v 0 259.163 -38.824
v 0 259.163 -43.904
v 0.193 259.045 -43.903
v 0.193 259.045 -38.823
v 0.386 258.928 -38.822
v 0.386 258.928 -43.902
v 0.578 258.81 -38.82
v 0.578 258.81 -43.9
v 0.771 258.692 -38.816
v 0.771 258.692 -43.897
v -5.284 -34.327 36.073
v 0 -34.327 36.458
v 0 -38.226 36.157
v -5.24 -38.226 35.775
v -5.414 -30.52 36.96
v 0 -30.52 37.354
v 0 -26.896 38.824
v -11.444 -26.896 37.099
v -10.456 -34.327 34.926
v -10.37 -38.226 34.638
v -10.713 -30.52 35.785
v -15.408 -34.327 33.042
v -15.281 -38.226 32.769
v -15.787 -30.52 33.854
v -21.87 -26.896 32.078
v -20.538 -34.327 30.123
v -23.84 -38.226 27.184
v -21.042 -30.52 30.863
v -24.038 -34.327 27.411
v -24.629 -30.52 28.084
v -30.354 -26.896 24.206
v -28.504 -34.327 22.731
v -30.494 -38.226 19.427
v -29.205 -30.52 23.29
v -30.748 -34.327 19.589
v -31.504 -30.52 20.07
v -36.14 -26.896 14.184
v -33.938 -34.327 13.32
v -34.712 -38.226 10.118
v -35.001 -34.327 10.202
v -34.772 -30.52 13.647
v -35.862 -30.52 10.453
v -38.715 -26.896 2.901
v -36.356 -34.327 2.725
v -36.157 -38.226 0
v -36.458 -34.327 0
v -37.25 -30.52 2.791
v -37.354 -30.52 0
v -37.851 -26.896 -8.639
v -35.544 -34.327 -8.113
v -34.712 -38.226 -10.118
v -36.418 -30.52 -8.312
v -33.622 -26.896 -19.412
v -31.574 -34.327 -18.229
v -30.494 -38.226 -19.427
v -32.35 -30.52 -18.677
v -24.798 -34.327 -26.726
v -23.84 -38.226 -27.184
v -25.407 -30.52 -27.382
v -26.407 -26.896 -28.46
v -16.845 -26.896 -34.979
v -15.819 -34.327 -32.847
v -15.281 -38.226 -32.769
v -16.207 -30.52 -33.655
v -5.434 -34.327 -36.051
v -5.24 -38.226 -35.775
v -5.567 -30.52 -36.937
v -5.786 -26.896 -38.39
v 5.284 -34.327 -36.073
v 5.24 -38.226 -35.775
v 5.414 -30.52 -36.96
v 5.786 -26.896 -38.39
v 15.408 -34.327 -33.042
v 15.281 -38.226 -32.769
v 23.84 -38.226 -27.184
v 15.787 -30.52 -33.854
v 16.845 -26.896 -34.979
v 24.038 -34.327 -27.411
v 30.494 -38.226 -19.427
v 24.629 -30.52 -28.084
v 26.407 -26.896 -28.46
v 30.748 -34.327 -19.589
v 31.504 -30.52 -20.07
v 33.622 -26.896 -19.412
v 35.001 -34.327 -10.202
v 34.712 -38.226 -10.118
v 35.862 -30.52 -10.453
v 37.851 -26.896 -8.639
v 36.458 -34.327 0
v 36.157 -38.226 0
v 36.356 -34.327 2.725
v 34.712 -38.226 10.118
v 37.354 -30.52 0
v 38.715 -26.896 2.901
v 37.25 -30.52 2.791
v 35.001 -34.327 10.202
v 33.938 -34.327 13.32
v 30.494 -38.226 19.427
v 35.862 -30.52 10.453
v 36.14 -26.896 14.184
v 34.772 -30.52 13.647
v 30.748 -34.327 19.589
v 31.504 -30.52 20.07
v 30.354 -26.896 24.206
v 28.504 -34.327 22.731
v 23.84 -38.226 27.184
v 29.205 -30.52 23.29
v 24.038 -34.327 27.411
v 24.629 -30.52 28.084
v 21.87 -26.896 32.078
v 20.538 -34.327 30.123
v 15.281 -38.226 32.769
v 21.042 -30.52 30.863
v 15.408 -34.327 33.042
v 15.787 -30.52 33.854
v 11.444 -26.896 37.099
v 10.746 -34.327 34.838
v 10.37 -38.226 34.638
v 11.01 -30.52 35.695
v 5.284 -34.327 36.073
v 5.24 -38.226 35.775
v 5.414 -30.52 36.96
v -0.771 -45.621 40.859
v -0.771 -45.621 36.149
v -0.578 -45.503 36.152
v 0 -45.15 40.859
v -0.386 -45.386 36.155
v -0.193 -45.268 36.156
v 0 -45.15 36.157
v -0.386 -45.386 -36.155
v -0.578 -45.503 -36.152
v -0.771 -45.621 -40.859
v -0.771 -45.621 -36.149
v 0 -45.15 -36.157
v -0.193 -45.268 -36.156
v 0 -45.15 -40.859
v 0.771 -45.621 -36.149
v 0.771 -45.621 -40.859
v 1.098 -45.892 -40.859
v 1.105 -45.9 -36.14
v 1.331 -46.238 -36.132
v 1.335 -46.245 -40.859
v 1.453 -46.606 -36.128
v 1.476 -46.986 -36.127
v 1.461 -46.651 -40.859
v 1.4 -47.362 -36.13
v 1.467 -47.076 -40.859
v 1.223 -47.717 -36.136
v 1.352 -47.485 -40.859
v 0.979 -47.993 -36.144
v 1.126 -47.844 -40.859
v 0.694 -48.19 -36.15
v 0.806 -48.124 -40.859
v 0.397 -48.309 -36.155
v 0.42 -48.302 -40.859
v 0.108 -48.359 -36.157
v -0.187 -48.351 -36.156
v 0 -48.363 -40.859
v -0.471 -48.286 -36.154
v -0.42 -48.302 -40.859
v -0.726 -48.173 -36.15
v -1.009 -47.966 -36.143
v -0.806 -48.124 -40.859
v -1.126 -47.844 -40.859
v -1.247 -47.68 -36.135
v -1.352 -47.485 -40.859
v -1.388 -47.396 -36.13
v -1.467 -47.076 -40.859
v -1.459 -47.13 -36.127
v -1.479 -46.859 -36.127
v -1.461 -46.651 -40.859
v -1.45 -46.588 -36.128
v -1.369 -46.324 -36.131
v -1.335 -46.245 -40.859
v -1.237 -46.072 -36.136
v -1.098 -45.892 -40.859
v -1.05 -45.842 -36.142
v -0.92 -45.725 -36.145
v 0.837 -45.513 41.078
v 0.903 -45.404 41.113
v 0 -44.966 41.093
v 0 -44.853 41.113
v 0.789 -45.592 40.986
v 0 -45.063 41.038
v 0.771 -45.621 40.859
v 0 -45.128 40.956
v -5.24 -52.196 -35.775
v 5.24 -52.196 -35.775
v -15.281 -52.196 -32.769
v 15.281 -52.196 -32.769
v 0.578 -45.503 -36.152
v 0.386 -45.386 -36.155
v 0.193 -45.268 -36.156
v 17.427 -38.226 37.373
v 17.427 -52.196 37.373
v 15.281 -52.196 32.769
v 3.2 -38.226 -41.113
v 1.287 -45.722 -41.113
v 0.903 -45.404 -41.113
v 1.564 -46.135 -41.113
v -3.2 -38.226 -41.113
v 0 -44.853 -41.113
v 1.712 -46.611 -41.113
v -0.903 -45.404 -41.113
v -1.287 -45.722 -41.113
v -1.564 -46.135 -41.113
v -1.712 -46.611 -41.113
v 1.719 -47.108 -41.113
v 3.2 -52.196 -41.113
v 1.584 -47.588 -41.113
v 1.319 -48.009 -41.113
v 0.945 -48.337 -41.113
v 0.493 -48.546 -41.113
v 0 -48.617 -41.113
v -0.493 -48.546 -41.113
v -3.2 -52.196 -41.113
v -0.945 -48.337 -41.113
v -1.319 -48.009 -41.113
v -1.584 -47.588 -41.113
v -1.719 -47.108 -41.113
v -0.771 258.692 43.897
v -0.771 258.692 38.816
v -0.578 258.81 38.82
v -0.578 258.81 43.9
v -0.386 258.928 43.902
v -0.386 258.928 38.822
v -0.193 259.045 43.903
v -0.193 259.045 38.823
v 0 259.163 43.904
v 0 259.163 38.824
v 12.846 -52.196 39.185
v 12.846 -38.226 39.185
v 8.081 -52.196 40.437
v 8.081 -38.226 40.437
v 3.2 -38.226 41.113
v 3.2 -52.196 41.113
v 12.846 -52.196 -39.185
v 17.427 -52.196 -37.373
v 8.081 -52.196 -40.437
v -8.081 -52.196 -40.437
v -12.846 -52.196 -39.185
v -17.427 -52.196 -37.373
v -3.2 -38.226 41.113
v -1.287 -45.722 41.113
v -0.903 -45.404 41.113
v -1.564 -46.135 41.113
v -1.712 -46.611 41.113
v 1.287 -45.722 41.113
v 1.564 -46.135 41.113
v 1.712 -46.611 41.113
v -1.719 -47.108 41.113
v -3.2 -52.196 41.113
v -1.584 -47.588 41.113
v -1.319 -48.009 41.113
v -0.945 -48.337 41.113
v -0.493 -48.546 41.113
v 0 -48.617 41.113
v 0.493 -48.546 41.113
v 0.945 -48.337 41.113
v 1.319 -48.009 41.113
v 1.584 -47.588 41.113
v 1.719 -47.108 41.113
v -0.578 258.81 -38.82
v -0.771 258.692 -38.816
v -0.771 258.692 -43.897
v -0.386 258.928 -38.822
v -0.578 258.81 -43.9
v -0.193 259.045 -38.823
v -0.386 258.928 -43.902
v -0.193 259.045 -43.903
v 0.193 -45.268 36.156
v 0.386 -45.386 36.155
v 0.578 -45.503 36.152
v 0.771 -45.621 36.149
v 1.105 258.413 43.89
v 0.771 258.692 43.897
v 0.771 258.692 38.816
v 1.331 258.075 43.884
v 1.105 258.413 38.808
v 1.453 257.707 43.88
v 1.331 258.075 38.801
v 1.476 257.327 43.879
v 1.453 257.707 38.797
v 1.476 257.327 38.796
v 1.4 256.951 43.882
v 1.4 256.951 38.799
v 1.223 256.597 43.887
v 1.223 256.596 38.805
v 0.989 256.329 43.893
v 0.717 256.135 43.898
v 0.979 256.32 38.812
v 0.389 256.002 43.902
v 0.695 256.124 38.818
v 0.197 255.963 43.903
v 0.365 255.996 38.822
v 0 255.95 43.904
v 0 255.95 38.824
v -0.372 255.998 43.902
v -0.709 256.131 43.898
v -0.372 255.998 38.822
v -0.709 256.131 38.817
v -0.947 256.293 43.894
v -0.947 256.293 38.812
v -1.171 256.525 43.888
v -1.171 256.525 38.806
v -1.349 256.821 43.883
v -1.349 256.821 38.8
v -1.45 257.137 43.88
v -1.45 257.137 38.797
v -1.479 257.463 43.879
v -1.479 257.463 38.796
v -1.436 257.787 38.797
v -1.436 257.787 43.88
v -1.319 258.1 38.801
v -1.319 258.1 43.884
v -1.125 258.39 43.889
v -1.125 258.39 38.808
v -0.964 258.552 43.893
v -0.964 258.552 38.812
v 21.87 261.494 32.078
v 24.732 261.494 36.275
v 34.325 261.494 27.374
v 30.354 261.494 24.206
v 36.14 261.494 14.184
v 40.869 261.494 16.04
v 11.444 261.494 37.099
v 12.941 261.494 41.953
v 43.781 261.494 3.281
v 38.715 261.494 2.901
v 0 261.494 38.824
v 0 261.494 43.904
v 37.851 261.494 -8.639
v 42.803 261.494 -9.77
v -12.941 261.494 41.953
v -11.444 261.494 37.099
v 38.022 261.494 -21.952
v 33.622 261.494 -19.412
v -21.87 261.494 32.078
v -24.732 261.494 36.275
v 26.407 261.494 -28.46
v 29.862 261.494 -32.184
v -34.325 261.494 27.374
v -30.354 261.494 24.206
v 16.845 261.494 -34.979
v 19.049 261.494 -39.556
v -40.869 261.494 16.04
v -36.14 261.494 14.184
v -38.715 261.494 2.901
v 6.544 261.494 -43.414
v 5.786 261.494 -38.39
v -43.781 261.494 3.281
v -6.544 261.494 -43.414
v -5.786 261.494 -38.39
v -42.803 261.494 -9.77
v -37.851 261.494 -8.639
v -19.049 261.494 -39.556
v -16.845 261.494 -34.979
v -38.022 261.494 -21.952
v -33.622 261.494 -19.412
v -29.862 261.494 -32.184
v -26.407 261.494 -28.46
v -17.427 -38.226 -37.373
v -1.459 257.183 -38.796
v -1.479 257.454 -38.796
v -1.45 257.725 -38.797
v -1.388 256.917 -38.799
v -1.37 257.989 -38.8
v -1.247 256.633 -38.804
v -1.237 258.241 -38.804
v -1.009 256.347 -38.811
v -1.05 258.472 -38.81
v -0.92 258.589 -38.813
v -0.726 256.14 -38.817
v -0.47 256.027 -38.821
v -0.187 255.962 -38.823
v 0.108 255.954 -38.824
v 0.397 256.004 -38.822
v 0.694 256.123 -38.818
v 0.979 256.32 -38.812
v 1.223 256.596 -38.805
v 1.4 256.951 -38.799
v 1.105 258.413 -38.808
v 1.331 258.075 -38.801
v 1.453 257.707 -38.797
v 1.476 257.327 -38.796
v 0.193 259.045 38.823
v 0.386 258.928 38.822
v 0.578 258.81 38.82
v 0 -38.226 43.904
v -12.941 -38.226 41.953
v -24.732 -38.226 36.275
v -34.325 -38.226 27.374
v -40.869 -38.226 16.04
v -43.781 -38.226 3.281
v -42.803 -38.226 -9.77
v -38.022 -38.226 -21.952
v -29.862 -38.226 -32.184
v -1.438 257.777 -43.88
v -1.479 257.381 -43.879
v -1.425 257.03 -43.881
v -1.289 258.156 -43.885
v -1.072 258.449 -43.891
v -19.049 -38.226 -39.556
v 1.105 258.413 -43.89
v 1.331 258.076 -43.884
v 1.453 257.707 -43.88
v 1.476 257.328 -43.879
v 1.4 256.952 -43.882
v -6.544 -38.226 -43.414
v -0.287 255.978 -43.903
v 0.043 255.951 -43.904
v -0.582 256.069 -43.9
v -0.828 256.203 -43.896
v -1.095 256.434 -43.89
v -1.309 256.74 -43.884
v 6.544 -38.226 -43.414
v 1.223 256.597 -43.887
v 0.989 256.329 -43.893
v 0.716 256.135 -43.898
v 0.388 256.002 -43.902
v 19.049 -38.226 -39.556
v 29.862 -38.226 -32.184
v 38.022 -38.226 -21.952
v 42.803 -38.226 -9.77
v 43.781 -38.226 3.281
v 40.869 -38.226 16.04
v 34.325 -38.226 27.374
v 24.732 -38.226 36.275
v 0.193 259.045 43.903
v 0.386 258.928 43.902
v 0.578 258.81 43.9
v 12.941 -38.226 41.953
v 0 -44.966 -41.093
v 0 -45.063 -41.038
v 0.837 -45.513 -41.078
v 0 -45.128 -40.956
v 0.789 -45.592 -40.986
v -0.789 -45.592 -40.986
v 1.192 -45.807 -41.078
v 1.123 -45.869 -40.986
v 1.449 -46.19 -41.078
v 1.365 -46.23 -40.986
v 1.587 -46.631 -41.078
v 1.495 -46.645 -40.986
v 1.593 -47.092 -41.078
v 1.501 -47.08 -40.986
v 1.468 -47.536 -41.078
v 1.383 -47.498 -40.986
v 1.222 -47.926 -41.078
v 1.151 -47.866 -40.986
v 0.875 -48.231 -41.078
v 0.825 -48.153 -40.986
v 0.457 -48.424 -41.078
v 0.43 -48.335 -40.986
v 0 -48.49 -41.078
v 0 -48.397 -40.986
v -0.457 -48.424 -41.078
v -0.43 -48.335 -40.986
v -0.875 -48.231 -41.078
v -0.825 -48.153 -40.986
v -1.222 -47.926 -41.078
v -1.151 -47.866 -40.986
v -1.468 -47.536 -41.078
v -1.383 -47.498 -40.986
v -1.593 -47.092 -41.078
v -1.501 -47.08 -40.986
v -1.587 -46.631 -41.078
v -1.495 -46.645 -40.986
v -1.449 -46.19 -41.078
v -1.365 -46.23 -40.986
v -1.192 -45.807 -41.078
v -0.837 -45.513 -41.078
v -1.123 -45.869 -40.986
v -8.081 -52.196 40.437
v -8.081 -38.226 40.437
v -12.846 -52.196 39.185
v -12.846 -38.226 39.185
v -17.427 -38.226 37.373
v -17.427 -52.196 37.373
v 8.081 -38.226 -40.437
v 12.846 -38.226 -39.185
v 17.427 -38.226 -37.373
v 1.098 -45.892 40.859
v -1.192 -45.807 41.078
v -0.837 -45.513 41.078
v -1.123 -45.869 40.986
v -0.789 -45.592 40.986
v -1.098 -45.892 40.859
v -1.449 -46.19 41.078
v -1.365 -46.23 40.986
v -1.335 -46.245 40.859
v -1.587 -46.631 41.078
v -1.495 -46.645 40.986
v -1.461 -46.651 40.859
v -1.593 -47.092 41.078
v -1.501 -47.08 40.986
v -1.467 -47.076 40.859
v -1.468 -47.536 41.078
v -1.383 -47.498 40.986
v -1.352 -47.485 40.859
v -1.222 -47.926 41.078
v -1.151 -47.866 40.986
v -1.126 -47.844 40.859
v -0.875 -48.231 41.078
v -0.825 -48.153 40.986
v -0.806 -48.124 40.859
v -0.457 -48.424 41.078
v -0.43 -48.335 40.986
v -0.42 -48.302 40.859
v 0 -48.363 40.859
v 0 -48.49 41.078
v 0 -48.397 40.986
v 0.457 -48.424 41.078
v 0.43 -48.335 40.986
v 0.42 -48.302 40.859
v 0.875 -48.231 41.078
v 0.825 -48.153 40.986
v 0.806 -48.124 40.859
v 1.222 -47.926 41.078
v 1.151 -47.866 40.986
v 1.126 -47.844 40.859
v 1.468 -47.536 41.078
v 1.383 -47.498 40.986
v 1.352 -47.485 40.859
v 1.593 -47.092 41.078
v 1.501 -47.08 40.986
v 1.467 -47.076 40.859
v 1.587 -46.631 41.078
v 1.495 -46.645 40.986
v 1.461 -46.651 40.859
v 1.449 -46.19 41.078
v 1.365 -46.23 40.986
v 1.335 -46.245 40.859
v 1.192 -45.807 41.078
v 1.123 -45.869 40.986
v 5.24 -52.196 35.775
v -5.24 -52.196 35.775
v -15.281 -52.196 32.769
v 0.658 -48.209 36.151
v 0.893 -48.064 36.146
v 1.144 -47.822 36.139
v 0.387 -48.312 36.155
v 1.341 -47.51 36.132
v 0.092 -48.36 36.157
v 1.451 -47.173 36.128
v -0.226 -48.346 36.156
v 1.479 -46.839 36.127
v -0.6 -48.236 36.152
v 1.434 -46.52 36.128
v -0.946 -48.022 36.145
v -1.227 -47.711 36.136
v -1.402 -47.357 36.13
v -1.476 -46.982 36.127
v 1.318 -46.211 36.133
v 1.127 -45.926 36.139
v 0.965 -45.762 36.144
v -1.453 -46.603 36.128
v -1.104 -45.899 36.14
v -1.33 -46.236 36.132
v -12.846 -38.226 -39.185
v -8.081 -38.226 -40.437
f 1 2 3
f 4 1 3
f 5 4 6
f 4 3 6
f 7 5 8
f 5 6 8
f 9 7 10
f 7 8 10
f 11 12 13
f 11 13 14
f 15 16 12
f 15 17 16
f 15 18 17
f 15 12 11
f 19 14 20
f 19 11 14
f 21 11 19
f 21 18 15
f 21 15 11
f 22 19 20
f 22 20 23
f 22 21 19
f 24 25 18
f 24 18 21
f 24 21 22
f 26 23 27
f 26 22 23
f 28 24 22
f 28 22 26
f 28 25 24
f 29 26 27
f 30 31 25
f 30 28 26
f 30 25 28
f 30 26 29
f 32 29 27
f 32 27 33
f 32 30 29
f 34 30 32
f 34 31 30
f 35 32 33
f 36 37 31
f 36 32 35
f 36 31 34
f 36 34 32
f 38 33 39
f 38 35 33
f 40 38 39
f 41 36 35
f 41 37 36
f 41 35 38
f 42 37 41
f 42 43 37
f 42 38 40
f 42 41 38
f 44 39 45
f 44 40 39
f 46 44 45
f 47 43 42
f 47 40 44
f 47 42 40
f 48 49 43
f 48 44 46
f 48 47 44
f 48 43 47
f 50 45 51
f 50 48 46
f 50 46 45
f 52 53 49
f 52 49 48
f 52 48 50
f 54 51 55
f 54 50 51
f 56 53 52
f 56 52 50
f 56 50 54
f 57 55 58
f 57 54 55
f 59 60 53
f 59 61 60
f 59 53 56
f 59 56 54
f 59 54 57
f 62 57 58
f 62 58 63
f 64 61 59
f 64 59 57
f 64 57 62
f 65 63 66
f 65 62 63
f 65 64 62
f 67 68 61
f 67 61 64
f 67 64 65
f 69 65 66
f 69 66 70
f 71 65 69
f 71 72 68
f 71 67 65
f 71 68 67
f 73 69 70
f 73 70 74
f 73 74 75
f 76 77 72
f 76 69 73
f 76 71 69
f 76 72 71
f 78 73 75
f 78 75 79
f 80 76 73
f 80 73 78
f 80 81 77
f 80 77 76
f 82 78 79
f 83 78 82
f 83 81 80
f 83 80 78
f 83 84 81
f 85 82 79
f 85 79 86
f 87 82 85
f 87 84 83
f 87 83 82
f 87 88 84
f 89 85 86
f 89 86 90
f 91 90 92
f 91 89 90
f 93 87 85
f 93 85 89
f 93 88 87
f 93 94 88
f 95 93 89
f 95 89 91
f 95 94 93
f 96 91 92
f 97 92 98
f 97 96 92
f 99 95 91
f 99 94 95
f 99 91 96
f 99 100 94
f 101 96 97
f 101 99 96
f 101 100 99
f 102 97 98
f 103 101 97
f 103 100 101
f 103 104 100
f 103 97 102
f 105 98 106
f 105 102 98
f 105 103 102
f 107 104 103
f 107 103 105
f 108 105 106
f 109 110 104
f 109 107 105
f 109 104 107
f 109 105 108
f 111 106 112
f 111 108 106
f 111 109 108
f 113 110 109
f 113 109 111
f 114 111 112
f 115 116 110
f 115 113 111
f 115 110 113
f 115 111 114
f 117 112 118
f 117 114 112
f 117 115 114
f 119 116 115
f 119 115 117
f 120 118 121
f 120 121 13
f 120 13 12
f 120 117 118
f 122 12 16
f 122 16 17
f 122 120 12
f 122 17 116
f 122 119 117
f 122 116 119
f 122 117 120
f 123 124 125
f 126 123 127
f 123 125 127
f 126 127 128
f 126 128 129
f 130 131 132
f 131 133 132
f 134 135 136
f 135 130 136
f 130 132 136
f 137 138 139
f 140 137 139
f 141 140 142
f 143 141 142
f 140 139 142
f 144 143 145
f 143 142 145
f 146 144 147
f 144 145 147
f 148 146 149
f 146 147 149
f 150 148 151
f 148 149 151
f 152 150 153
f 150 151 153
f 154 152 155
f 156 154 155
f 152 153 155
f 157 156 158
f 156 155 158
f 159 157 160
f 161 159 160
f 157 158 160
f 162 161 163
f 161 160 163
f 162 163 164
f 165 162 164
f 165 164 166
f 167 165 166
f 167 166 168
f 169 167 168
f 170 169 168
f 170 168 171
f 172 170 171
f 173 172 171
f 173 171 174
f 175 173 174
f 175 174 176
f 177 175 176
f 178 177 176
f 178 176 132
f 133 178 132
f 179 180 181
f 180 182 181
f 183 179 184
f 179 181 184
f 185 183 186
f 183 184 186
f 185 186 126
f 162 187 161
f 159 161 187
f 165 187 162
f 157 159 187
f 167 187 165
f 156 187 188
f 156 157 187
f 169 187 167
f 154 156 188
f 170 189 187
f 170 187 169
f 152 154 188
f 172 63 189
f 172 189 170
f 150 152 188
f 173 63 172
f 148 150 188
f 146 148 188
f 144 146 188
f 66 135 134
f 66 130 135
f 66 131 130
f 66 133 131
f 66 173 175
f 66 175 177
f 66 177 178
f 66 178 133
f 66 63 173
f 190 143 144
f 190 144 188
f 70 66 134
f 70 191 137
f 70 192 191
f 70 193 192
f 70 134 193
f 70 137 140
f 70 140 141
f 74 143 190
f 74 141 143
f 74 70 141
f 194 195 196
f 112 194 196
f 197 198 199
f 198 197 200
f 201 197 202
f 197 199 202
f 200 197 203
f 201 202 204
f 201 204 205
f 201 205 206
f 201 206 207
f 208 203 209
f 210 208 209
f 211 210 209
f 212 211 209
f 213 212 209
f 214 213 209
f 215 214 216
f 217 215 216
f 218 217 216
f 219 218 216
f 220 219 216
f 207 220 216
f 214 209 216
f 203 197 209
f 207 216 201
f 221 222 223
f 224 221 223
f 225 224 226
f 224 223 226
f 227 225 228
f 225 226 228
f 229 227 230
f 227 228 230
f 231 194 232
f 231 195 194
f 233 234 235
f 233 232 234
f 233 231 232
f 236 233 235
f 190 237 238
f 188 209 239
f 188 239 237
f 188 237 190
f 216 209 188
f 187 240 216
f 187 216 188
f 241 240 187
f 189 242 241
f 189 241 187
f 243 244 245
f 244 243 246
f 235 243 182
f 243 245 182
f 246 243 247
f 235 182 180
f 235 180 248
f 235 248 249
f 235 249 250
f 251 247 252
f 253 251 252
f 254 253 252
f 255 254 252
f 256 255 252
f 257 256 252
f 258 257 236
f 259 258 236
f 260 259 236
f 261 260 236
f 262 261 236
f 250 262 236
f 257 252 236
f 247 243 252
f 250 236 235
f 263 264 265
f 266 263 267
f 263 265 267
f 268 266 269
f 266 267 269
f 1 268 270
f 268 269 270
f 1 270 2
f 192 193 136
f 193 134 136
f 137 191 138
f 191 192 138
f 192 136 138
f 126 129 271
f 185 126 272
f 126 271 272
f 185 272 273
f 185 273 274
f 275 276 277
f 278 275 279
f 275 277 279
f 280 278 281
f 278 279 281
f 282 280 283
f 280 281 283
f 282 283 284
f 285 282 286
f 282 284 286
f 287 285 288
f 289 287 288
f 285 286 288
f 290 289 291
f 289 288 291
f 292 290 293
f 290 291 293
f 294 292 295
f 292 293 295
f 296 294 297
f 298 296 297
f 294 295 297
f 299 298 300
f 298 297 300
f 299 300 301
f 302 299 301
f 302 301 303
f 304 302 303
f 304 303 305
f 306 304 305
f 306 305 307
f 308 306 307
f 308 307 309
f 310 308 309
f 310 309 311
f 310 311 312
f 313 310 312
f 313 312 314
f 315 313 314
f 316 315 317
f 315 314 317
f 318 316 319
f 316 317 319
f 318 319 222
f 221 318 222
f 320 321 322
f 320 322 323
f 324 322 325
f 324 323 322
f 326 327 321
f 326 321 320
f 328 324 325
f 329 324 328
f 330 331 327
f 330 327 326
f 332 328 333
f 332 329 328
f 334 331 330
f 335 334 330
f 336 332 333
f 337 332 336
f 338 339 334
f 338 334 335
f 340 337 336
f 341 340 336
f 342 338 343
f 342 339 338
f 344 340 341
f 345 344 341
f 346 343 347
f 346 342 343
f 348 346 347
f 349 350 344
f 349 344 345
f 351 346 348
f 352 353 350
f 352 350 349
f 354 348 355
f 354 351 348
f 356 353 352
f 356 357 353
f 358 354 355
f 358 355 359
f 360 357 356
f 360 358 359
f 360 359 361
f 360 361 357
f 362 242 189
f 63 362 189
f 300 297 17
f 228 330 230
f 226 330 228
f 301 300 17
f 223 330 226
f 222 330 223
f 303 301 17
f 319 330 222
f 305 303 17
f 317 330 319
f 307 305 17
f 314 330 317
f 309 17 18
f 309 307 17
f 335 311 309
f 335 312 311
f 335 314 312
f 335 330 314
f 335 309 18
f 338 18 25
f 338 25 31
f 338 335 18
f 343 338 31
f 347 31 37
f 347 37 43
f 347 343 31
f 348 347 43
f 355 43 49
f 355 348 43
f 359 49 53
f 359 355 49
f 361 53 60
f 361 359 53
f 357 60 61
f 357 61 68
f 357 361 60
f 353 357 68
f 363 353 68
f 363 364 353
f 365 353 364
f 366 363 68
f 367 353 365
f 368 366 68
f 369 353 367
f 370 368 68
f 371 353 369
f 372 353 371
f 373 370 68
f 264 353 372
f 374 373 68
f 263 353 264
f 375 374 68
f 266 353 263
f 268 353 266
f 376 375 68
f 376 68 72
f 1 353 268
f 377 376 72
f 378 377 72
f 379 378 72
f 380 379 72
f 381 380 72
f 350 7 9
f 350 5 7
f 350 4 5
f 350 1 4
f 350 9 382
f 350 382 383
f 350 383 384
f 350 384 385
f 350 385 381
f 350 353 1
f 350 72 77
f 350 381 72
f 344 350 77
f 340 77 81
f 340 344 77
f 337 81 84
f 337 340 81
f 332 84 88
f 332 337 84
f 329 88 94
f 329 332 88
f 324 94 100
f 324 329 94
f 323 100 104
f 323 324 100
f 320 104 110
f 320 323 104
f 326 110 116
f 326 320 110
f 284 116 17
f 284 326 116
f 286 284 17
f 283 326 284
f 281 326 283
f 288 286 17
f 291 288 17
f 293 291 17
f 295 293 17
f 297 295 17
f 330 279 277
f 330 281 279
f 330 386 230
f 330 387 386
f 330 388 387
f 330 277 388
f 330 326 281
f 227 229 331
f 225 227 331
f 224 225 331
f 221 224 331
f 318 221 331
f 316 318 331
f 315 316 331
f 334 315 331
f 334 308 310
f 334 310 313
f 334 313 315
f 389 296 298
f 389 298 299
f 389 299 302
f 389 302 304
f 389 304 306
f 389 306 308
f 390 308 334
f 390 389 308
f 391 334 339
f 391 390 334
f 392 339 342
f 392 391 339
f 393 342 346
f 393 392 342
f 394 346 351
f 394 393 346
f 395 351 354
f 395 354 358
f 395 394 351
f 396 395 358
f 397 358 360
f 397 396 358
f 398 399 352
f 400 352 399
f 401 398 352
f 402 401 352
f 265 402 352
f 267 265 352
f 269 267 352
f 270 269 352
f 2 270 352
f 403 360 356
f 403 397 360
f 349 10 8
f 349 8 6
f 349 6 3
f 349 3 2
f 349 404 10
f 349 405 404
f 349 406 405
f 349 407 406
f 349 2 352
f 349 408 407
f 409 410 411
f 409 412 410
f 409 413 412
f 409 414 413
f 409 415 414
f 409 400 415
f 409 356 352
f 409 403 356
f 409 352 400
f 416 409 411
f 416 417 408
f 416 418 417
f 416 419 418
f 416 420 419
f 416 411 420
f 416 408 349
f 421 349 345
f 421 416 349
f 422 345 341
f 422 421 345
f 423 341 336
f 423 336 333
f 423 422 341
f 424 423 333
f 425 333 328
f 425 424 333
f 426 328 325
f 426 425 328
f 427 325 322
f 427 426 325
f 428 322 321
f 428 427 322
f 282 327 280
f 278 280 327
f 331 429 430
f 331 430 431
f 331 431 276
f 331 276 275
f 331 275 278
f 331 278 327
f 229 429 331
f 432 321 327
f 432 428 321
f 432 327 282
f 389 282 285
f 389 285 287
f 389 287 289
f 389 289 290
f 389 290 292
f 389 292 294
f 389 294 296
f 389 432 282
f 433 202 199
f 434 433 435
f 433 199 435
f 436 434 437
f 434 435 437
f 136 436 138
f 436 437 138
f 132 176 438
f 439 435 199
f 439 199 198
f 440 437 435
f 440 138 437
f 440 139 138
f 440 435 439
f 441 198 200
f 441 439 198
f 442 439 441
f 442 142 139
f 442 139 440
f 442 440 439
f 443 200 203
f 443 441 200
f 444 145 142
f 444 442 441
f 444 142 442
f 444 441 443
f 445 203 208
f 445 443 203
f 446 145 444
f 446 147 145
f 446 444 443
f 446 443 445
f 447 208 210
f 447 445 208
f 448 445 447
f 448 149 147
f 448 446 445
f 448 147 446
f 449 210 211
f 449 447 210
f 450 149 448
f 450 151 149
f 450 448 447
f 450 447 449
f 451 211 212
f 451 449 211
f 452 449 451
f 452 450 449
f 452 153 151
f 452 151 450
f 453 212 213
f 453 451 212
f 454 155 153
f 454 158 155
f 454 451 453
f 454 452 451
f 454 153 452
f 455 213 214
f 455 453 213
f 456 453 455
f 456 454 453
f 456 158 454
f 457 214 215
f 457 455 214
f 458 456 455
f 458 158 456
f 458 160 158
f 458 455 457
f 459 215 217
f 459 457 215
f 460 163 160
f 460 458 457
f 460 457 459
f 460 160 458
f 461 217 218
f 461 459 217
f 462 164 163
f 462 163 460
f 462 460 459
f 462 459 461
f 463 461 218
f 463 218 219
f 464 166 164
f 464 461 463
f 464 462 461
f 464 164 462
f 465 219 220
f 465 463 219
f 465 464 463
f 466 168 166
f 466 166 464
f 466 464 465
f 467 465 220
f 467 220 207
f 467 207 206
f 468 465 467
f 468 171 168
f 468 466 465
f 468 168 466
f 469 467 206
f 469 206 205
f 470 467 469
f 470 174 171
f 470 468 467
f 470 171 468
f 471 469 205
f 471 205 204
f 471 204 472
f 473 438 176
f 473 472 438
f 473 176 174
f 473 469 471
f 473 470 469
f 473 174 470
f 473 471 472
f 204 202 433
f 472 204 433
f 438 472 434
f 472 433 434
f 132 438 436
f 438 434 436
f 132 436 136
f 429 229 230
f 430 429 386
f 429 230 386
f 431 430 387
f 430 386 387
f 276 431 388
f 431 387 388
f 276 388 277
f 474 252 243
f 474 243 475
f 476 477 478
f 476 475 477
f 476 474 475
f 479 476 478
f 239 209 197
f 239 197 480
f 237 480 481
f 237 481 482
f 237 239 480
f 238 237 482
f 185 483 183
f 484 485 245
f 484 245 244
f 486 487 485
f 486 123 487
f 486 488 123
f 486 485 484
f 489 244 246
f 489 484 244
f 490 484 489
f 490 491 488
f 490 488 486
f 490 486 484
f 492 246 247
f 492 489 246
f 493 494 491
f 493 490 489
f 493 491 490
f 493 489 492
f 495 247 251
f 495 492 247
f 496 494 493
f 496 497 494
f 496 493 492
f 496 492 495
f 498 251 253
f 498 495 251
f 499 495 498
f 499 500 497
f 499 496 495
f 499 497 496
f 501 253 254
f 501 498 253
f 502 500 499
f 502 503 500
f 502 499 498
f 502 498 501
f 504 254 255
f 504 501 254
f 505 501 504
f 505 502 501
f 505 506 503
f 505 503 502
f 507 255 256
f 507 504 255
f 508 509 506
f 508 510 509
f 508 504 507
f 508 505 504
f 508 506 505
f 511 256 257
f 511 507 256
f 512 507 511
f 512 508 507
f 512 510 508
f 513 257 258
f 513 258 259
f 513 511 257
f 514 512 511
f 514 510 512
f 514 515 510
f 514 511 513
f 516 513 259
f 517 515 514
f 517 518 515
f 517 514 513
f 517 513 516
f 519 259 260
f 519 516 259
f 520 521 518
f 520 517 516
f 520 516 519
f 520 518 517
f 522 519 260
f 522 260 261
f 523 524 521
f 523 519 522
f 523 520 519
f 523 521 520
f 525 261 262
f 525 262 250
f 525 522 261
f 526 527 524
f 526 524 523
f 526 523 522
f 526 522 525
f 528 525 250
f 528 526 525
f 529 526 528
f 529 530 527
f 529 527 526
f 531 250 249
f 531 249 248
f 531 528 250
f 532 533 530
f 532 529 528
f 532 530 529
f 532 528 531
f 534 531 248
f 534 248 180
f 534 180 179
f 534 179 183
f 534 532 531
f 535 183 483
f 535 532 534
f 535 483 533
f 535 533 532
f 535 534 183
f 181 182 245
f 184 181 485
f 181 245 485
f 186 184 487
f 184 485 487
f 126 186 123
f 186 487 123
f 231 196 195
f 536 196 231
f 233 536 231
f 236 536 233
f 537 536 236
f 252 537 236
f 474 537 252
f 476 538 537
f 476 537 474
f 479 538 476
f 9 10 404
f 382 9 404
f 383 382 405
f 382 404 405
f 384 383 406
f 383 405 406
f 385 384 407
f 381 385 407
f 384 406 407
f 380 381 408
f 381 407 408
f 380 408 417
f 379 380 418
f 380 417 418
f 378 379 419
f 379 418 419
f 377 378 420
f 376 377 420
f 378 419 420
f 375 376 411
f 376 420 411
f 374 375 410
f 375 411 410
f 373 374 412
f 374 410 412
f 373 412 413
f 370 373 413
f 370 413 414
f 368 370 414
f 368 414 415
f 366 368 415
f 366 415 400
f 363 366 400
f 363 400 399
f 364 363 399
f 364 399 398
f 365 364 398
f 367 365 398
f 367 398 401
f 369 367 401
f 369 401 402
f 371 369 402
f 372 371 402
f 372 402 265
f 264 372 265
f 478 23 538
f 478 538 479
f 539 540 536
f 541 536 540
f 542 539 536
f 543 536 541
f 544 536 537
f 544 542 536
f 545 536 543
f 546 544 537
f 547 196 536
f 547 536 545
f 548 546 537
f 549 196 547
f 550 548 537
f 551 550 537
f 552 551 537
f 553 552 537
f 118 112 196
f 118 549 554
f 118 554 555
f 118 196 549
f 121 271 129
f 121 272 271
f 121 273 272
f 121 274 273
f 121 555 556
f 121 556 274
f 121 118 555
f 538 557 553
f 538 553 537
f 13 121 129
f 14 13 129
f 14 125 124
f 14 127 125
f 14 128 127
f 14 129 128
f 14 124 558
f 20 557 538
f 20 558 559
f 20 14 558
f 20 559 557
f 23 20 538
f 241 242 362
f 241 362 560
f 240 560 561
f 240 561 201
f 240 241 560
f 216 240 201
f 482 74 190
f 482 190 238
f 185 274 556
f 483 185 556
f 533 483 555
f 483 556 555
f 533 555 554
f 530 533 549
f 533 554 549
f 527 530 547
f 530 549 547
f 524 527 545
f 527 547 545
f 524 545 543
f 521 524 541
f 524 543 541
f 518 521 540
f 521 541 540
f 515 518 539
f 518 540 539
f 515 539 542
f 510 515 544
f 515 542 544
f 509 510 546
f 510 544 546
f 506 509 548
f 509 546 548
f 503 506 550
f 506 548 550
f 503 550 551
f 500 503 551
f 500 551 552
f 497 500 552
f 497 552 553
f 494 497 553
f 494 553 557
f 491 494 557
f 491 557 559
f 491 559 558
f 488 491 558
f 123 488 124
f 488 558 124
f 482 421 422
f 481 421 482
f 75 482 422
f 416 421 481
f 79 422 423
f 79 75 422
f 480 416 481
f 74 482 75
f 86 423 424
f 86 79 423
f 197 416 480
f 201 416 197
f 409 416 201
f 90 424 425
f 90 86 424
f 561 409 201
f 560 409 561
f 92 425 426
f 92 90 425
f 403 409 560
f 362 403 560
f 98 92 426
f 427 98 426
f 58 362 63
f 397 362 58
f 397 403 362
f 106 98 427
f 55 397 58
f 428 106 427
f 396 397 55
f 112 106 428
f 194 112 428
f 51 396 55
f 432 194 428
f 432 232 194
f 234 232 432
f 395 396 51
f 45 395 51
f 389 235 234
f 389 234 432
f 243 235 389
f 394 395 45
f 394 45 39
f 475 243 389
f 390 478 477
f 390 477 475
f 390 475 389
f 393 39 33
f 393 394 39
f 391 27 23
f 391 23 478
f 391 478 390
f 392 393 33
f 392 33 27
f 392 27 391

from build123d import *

# Parameters (mm, degrees)
CUT_EXTRUDE1_DEPTH      = 269.763771223
CUT_EXTRUDE1_DEPTH_BACK = 269.763771223
CUT_EXTRUDE4_DEPTH      = 13.97
CUT_EXTRUDE5_DEPTH      = 13.97
CIRPATTERN1_COUNT       = 2
CUT_EXTRUDE6_DEPTH      = 269.763771223
CUT_EXTRUDE6_DEPTH_BACK = 269.763771223
FILLET1_R               = 0.254


with BuildPart() as part:
    # Sketch1 → Revolve1 (revolve)
    with BuildSketch(Plane.XY, mode=Mode.PRIVATE) as revolve1_sk:
        with BuildLine():
            Line((-38.8239, 261.4935178), (-43.9039, 261.4935178))
            Line((-43.9039, 261.4935178), (-43.9039, -38.2264822))
            Line((-43.9039, -38.2264822), (-41.2369, -38.2264822))
            Line((-41.2369, -38.2264822), (-41.2369, -52.1964822))
            Line((-41.2369, -52.1964822), (-36.1569, -52.1964822))
            Line((-36.1569, -52.1964822), (-36.1569, -38.2264822))
            ThreePointArc((-36.1569, -38.2264822), (-36.832638636, -32.406611067), (-38.8239, -26.89640228))
            Line((-38.8239, -26.89640228), (-38.8239, 261.4935178))
        make_face()
    revolve(revolve1_sk.sketch.rotate(Axis((0, 16.071963393, 0), (0, -1, 0)), 270), axis=Axis((0, 16.071963393, 0), (0, -1, 0)))

    # Sketch2 → Cut-Extrude1 (cut, two sides: drawn at the far end of the back side and taken through both)
    with BuildSketch(Plane.XY.offset(-CUT_EXTRUDE1_DEPTH_BACK)):
        with BuildLine():
            Line((-0.771031735, -45.62095313), (0, -45.150169247))
            Line((0, -45.150169247), (0.771031735, -45.62095313))
            ThreePointArc((0.771031735, -45.62095313), (0, -48.363269247), (-0.771031735, -45.62095313))
        make_face()
    extrude(amount=CUT_EXTRUDE1_DEPTH + CUT_EXTRUDE1_DEPTH_BACK, mode=Mode.SUBTRACT)

    # Sketch3 → Cut-Extrude4 (cut)
    with BuildSketch(Plane.XZ.offset(52.1964822)):
        with BuildLine():
            Line((-17.427466998, -37.373323583), (0, 0))
            Line((0, 0), (-17.427466998, 37.373323583))
            ThreePointArc((-17.427466998, 37.373323583), (-41.2369, 0), (-17.427466998, -37.373323583))
        make_face()
        with BuildLine():
            Line((17.427466998, 37.373323583), (0, 0))
            Line((0, 0), (17.427466998, -37.373323583))
            ThreePointArc((17.427466998, -37.373323583), (34.778848712, -22.156570219), (41.2369, 0))
            ThreePointArc((41.2369, 0), (34.778848712, 22.156570219), (17.427466998, 37.373323583))
        make_face()
    extrude(amount=-CUT_EXTRUDE4_DEPTH, mode=Mode.SUBTRACT)

    # Sketch4 → Cut-Extrude5 (cut)
    with BuildSketch(Plane.XZ.offset(52.1964822)):
        with BuildLine():
            ThreePointArc((-3.2004, -41.112520738), (-1.601408002, -41.205793452), (0, -41.2369))
            ThreePointArc((0, -41.2369), (1.601408002, -41.205793452), (3.2004, -41.112520738))
            Line((3.2004, -41.112520738), (-3.2004, -41.112520738))
        make_face()
    cut_extrude5 = extrude(amount=-CUT_EXTRUDE5_DEPTH, mode=Mode.SUBTRACT)

    # CirPattern1: Cut-Extrude5 ×2 about axis
    cirpattern1_axis = Axis((0, 0, 0), (0, 1, 0))
    for i in range(1, CIRPATTERN1_COUNT):
        add(cut_extrude5.rotate(cirpattern1_axis, i * 360 / CIRPATTERN1_COUNT), mode=Mode.SUBTRACT)

    # Sketch5 → Cut-Extrude6 (cut, two sides: drawn at the far end of the back side and taken through both)
    with BuildSketch(Plane.XY.offset(-CUT_EXTRUDE6_DEPTH_BACK)):
        with BuildLine():
            Line((-0.771031735, 258.692283917), (0, 259.1630678))
            Line((0, 259.1630678), (0.771031735, 258.692283917))
            ThreePointArc((0.771031735, 258.692283917), (0, 255.9499678), (-0.771031735, 258.692283917))
        make_face()
    extrude(amount=CUT_EXTRUDE6_DEPTH + CUT_EXTRUDE6_DEPTH_BACK, mode=Mode.SUBTRACT)

    # Fillet1
    fillet1_edges = [part.edges().sort_by_distance(p)[0] for p in [
        (-0.385515867, -45.385561188, 41.112520738),
        (0.385515867, -45.385561188, 41.112520738),
        (0, -48.363269247, 41.112520738),
        (0, -48.363269247, -41.112520738),
        (-0.385515867, -45.385561188, -41.112520738),
        (0.385515867, -45.385561188, -41.112520738),
    ]]
    fillet(fillet1_edges, radius=FILLET1_R)


solid = part.part
